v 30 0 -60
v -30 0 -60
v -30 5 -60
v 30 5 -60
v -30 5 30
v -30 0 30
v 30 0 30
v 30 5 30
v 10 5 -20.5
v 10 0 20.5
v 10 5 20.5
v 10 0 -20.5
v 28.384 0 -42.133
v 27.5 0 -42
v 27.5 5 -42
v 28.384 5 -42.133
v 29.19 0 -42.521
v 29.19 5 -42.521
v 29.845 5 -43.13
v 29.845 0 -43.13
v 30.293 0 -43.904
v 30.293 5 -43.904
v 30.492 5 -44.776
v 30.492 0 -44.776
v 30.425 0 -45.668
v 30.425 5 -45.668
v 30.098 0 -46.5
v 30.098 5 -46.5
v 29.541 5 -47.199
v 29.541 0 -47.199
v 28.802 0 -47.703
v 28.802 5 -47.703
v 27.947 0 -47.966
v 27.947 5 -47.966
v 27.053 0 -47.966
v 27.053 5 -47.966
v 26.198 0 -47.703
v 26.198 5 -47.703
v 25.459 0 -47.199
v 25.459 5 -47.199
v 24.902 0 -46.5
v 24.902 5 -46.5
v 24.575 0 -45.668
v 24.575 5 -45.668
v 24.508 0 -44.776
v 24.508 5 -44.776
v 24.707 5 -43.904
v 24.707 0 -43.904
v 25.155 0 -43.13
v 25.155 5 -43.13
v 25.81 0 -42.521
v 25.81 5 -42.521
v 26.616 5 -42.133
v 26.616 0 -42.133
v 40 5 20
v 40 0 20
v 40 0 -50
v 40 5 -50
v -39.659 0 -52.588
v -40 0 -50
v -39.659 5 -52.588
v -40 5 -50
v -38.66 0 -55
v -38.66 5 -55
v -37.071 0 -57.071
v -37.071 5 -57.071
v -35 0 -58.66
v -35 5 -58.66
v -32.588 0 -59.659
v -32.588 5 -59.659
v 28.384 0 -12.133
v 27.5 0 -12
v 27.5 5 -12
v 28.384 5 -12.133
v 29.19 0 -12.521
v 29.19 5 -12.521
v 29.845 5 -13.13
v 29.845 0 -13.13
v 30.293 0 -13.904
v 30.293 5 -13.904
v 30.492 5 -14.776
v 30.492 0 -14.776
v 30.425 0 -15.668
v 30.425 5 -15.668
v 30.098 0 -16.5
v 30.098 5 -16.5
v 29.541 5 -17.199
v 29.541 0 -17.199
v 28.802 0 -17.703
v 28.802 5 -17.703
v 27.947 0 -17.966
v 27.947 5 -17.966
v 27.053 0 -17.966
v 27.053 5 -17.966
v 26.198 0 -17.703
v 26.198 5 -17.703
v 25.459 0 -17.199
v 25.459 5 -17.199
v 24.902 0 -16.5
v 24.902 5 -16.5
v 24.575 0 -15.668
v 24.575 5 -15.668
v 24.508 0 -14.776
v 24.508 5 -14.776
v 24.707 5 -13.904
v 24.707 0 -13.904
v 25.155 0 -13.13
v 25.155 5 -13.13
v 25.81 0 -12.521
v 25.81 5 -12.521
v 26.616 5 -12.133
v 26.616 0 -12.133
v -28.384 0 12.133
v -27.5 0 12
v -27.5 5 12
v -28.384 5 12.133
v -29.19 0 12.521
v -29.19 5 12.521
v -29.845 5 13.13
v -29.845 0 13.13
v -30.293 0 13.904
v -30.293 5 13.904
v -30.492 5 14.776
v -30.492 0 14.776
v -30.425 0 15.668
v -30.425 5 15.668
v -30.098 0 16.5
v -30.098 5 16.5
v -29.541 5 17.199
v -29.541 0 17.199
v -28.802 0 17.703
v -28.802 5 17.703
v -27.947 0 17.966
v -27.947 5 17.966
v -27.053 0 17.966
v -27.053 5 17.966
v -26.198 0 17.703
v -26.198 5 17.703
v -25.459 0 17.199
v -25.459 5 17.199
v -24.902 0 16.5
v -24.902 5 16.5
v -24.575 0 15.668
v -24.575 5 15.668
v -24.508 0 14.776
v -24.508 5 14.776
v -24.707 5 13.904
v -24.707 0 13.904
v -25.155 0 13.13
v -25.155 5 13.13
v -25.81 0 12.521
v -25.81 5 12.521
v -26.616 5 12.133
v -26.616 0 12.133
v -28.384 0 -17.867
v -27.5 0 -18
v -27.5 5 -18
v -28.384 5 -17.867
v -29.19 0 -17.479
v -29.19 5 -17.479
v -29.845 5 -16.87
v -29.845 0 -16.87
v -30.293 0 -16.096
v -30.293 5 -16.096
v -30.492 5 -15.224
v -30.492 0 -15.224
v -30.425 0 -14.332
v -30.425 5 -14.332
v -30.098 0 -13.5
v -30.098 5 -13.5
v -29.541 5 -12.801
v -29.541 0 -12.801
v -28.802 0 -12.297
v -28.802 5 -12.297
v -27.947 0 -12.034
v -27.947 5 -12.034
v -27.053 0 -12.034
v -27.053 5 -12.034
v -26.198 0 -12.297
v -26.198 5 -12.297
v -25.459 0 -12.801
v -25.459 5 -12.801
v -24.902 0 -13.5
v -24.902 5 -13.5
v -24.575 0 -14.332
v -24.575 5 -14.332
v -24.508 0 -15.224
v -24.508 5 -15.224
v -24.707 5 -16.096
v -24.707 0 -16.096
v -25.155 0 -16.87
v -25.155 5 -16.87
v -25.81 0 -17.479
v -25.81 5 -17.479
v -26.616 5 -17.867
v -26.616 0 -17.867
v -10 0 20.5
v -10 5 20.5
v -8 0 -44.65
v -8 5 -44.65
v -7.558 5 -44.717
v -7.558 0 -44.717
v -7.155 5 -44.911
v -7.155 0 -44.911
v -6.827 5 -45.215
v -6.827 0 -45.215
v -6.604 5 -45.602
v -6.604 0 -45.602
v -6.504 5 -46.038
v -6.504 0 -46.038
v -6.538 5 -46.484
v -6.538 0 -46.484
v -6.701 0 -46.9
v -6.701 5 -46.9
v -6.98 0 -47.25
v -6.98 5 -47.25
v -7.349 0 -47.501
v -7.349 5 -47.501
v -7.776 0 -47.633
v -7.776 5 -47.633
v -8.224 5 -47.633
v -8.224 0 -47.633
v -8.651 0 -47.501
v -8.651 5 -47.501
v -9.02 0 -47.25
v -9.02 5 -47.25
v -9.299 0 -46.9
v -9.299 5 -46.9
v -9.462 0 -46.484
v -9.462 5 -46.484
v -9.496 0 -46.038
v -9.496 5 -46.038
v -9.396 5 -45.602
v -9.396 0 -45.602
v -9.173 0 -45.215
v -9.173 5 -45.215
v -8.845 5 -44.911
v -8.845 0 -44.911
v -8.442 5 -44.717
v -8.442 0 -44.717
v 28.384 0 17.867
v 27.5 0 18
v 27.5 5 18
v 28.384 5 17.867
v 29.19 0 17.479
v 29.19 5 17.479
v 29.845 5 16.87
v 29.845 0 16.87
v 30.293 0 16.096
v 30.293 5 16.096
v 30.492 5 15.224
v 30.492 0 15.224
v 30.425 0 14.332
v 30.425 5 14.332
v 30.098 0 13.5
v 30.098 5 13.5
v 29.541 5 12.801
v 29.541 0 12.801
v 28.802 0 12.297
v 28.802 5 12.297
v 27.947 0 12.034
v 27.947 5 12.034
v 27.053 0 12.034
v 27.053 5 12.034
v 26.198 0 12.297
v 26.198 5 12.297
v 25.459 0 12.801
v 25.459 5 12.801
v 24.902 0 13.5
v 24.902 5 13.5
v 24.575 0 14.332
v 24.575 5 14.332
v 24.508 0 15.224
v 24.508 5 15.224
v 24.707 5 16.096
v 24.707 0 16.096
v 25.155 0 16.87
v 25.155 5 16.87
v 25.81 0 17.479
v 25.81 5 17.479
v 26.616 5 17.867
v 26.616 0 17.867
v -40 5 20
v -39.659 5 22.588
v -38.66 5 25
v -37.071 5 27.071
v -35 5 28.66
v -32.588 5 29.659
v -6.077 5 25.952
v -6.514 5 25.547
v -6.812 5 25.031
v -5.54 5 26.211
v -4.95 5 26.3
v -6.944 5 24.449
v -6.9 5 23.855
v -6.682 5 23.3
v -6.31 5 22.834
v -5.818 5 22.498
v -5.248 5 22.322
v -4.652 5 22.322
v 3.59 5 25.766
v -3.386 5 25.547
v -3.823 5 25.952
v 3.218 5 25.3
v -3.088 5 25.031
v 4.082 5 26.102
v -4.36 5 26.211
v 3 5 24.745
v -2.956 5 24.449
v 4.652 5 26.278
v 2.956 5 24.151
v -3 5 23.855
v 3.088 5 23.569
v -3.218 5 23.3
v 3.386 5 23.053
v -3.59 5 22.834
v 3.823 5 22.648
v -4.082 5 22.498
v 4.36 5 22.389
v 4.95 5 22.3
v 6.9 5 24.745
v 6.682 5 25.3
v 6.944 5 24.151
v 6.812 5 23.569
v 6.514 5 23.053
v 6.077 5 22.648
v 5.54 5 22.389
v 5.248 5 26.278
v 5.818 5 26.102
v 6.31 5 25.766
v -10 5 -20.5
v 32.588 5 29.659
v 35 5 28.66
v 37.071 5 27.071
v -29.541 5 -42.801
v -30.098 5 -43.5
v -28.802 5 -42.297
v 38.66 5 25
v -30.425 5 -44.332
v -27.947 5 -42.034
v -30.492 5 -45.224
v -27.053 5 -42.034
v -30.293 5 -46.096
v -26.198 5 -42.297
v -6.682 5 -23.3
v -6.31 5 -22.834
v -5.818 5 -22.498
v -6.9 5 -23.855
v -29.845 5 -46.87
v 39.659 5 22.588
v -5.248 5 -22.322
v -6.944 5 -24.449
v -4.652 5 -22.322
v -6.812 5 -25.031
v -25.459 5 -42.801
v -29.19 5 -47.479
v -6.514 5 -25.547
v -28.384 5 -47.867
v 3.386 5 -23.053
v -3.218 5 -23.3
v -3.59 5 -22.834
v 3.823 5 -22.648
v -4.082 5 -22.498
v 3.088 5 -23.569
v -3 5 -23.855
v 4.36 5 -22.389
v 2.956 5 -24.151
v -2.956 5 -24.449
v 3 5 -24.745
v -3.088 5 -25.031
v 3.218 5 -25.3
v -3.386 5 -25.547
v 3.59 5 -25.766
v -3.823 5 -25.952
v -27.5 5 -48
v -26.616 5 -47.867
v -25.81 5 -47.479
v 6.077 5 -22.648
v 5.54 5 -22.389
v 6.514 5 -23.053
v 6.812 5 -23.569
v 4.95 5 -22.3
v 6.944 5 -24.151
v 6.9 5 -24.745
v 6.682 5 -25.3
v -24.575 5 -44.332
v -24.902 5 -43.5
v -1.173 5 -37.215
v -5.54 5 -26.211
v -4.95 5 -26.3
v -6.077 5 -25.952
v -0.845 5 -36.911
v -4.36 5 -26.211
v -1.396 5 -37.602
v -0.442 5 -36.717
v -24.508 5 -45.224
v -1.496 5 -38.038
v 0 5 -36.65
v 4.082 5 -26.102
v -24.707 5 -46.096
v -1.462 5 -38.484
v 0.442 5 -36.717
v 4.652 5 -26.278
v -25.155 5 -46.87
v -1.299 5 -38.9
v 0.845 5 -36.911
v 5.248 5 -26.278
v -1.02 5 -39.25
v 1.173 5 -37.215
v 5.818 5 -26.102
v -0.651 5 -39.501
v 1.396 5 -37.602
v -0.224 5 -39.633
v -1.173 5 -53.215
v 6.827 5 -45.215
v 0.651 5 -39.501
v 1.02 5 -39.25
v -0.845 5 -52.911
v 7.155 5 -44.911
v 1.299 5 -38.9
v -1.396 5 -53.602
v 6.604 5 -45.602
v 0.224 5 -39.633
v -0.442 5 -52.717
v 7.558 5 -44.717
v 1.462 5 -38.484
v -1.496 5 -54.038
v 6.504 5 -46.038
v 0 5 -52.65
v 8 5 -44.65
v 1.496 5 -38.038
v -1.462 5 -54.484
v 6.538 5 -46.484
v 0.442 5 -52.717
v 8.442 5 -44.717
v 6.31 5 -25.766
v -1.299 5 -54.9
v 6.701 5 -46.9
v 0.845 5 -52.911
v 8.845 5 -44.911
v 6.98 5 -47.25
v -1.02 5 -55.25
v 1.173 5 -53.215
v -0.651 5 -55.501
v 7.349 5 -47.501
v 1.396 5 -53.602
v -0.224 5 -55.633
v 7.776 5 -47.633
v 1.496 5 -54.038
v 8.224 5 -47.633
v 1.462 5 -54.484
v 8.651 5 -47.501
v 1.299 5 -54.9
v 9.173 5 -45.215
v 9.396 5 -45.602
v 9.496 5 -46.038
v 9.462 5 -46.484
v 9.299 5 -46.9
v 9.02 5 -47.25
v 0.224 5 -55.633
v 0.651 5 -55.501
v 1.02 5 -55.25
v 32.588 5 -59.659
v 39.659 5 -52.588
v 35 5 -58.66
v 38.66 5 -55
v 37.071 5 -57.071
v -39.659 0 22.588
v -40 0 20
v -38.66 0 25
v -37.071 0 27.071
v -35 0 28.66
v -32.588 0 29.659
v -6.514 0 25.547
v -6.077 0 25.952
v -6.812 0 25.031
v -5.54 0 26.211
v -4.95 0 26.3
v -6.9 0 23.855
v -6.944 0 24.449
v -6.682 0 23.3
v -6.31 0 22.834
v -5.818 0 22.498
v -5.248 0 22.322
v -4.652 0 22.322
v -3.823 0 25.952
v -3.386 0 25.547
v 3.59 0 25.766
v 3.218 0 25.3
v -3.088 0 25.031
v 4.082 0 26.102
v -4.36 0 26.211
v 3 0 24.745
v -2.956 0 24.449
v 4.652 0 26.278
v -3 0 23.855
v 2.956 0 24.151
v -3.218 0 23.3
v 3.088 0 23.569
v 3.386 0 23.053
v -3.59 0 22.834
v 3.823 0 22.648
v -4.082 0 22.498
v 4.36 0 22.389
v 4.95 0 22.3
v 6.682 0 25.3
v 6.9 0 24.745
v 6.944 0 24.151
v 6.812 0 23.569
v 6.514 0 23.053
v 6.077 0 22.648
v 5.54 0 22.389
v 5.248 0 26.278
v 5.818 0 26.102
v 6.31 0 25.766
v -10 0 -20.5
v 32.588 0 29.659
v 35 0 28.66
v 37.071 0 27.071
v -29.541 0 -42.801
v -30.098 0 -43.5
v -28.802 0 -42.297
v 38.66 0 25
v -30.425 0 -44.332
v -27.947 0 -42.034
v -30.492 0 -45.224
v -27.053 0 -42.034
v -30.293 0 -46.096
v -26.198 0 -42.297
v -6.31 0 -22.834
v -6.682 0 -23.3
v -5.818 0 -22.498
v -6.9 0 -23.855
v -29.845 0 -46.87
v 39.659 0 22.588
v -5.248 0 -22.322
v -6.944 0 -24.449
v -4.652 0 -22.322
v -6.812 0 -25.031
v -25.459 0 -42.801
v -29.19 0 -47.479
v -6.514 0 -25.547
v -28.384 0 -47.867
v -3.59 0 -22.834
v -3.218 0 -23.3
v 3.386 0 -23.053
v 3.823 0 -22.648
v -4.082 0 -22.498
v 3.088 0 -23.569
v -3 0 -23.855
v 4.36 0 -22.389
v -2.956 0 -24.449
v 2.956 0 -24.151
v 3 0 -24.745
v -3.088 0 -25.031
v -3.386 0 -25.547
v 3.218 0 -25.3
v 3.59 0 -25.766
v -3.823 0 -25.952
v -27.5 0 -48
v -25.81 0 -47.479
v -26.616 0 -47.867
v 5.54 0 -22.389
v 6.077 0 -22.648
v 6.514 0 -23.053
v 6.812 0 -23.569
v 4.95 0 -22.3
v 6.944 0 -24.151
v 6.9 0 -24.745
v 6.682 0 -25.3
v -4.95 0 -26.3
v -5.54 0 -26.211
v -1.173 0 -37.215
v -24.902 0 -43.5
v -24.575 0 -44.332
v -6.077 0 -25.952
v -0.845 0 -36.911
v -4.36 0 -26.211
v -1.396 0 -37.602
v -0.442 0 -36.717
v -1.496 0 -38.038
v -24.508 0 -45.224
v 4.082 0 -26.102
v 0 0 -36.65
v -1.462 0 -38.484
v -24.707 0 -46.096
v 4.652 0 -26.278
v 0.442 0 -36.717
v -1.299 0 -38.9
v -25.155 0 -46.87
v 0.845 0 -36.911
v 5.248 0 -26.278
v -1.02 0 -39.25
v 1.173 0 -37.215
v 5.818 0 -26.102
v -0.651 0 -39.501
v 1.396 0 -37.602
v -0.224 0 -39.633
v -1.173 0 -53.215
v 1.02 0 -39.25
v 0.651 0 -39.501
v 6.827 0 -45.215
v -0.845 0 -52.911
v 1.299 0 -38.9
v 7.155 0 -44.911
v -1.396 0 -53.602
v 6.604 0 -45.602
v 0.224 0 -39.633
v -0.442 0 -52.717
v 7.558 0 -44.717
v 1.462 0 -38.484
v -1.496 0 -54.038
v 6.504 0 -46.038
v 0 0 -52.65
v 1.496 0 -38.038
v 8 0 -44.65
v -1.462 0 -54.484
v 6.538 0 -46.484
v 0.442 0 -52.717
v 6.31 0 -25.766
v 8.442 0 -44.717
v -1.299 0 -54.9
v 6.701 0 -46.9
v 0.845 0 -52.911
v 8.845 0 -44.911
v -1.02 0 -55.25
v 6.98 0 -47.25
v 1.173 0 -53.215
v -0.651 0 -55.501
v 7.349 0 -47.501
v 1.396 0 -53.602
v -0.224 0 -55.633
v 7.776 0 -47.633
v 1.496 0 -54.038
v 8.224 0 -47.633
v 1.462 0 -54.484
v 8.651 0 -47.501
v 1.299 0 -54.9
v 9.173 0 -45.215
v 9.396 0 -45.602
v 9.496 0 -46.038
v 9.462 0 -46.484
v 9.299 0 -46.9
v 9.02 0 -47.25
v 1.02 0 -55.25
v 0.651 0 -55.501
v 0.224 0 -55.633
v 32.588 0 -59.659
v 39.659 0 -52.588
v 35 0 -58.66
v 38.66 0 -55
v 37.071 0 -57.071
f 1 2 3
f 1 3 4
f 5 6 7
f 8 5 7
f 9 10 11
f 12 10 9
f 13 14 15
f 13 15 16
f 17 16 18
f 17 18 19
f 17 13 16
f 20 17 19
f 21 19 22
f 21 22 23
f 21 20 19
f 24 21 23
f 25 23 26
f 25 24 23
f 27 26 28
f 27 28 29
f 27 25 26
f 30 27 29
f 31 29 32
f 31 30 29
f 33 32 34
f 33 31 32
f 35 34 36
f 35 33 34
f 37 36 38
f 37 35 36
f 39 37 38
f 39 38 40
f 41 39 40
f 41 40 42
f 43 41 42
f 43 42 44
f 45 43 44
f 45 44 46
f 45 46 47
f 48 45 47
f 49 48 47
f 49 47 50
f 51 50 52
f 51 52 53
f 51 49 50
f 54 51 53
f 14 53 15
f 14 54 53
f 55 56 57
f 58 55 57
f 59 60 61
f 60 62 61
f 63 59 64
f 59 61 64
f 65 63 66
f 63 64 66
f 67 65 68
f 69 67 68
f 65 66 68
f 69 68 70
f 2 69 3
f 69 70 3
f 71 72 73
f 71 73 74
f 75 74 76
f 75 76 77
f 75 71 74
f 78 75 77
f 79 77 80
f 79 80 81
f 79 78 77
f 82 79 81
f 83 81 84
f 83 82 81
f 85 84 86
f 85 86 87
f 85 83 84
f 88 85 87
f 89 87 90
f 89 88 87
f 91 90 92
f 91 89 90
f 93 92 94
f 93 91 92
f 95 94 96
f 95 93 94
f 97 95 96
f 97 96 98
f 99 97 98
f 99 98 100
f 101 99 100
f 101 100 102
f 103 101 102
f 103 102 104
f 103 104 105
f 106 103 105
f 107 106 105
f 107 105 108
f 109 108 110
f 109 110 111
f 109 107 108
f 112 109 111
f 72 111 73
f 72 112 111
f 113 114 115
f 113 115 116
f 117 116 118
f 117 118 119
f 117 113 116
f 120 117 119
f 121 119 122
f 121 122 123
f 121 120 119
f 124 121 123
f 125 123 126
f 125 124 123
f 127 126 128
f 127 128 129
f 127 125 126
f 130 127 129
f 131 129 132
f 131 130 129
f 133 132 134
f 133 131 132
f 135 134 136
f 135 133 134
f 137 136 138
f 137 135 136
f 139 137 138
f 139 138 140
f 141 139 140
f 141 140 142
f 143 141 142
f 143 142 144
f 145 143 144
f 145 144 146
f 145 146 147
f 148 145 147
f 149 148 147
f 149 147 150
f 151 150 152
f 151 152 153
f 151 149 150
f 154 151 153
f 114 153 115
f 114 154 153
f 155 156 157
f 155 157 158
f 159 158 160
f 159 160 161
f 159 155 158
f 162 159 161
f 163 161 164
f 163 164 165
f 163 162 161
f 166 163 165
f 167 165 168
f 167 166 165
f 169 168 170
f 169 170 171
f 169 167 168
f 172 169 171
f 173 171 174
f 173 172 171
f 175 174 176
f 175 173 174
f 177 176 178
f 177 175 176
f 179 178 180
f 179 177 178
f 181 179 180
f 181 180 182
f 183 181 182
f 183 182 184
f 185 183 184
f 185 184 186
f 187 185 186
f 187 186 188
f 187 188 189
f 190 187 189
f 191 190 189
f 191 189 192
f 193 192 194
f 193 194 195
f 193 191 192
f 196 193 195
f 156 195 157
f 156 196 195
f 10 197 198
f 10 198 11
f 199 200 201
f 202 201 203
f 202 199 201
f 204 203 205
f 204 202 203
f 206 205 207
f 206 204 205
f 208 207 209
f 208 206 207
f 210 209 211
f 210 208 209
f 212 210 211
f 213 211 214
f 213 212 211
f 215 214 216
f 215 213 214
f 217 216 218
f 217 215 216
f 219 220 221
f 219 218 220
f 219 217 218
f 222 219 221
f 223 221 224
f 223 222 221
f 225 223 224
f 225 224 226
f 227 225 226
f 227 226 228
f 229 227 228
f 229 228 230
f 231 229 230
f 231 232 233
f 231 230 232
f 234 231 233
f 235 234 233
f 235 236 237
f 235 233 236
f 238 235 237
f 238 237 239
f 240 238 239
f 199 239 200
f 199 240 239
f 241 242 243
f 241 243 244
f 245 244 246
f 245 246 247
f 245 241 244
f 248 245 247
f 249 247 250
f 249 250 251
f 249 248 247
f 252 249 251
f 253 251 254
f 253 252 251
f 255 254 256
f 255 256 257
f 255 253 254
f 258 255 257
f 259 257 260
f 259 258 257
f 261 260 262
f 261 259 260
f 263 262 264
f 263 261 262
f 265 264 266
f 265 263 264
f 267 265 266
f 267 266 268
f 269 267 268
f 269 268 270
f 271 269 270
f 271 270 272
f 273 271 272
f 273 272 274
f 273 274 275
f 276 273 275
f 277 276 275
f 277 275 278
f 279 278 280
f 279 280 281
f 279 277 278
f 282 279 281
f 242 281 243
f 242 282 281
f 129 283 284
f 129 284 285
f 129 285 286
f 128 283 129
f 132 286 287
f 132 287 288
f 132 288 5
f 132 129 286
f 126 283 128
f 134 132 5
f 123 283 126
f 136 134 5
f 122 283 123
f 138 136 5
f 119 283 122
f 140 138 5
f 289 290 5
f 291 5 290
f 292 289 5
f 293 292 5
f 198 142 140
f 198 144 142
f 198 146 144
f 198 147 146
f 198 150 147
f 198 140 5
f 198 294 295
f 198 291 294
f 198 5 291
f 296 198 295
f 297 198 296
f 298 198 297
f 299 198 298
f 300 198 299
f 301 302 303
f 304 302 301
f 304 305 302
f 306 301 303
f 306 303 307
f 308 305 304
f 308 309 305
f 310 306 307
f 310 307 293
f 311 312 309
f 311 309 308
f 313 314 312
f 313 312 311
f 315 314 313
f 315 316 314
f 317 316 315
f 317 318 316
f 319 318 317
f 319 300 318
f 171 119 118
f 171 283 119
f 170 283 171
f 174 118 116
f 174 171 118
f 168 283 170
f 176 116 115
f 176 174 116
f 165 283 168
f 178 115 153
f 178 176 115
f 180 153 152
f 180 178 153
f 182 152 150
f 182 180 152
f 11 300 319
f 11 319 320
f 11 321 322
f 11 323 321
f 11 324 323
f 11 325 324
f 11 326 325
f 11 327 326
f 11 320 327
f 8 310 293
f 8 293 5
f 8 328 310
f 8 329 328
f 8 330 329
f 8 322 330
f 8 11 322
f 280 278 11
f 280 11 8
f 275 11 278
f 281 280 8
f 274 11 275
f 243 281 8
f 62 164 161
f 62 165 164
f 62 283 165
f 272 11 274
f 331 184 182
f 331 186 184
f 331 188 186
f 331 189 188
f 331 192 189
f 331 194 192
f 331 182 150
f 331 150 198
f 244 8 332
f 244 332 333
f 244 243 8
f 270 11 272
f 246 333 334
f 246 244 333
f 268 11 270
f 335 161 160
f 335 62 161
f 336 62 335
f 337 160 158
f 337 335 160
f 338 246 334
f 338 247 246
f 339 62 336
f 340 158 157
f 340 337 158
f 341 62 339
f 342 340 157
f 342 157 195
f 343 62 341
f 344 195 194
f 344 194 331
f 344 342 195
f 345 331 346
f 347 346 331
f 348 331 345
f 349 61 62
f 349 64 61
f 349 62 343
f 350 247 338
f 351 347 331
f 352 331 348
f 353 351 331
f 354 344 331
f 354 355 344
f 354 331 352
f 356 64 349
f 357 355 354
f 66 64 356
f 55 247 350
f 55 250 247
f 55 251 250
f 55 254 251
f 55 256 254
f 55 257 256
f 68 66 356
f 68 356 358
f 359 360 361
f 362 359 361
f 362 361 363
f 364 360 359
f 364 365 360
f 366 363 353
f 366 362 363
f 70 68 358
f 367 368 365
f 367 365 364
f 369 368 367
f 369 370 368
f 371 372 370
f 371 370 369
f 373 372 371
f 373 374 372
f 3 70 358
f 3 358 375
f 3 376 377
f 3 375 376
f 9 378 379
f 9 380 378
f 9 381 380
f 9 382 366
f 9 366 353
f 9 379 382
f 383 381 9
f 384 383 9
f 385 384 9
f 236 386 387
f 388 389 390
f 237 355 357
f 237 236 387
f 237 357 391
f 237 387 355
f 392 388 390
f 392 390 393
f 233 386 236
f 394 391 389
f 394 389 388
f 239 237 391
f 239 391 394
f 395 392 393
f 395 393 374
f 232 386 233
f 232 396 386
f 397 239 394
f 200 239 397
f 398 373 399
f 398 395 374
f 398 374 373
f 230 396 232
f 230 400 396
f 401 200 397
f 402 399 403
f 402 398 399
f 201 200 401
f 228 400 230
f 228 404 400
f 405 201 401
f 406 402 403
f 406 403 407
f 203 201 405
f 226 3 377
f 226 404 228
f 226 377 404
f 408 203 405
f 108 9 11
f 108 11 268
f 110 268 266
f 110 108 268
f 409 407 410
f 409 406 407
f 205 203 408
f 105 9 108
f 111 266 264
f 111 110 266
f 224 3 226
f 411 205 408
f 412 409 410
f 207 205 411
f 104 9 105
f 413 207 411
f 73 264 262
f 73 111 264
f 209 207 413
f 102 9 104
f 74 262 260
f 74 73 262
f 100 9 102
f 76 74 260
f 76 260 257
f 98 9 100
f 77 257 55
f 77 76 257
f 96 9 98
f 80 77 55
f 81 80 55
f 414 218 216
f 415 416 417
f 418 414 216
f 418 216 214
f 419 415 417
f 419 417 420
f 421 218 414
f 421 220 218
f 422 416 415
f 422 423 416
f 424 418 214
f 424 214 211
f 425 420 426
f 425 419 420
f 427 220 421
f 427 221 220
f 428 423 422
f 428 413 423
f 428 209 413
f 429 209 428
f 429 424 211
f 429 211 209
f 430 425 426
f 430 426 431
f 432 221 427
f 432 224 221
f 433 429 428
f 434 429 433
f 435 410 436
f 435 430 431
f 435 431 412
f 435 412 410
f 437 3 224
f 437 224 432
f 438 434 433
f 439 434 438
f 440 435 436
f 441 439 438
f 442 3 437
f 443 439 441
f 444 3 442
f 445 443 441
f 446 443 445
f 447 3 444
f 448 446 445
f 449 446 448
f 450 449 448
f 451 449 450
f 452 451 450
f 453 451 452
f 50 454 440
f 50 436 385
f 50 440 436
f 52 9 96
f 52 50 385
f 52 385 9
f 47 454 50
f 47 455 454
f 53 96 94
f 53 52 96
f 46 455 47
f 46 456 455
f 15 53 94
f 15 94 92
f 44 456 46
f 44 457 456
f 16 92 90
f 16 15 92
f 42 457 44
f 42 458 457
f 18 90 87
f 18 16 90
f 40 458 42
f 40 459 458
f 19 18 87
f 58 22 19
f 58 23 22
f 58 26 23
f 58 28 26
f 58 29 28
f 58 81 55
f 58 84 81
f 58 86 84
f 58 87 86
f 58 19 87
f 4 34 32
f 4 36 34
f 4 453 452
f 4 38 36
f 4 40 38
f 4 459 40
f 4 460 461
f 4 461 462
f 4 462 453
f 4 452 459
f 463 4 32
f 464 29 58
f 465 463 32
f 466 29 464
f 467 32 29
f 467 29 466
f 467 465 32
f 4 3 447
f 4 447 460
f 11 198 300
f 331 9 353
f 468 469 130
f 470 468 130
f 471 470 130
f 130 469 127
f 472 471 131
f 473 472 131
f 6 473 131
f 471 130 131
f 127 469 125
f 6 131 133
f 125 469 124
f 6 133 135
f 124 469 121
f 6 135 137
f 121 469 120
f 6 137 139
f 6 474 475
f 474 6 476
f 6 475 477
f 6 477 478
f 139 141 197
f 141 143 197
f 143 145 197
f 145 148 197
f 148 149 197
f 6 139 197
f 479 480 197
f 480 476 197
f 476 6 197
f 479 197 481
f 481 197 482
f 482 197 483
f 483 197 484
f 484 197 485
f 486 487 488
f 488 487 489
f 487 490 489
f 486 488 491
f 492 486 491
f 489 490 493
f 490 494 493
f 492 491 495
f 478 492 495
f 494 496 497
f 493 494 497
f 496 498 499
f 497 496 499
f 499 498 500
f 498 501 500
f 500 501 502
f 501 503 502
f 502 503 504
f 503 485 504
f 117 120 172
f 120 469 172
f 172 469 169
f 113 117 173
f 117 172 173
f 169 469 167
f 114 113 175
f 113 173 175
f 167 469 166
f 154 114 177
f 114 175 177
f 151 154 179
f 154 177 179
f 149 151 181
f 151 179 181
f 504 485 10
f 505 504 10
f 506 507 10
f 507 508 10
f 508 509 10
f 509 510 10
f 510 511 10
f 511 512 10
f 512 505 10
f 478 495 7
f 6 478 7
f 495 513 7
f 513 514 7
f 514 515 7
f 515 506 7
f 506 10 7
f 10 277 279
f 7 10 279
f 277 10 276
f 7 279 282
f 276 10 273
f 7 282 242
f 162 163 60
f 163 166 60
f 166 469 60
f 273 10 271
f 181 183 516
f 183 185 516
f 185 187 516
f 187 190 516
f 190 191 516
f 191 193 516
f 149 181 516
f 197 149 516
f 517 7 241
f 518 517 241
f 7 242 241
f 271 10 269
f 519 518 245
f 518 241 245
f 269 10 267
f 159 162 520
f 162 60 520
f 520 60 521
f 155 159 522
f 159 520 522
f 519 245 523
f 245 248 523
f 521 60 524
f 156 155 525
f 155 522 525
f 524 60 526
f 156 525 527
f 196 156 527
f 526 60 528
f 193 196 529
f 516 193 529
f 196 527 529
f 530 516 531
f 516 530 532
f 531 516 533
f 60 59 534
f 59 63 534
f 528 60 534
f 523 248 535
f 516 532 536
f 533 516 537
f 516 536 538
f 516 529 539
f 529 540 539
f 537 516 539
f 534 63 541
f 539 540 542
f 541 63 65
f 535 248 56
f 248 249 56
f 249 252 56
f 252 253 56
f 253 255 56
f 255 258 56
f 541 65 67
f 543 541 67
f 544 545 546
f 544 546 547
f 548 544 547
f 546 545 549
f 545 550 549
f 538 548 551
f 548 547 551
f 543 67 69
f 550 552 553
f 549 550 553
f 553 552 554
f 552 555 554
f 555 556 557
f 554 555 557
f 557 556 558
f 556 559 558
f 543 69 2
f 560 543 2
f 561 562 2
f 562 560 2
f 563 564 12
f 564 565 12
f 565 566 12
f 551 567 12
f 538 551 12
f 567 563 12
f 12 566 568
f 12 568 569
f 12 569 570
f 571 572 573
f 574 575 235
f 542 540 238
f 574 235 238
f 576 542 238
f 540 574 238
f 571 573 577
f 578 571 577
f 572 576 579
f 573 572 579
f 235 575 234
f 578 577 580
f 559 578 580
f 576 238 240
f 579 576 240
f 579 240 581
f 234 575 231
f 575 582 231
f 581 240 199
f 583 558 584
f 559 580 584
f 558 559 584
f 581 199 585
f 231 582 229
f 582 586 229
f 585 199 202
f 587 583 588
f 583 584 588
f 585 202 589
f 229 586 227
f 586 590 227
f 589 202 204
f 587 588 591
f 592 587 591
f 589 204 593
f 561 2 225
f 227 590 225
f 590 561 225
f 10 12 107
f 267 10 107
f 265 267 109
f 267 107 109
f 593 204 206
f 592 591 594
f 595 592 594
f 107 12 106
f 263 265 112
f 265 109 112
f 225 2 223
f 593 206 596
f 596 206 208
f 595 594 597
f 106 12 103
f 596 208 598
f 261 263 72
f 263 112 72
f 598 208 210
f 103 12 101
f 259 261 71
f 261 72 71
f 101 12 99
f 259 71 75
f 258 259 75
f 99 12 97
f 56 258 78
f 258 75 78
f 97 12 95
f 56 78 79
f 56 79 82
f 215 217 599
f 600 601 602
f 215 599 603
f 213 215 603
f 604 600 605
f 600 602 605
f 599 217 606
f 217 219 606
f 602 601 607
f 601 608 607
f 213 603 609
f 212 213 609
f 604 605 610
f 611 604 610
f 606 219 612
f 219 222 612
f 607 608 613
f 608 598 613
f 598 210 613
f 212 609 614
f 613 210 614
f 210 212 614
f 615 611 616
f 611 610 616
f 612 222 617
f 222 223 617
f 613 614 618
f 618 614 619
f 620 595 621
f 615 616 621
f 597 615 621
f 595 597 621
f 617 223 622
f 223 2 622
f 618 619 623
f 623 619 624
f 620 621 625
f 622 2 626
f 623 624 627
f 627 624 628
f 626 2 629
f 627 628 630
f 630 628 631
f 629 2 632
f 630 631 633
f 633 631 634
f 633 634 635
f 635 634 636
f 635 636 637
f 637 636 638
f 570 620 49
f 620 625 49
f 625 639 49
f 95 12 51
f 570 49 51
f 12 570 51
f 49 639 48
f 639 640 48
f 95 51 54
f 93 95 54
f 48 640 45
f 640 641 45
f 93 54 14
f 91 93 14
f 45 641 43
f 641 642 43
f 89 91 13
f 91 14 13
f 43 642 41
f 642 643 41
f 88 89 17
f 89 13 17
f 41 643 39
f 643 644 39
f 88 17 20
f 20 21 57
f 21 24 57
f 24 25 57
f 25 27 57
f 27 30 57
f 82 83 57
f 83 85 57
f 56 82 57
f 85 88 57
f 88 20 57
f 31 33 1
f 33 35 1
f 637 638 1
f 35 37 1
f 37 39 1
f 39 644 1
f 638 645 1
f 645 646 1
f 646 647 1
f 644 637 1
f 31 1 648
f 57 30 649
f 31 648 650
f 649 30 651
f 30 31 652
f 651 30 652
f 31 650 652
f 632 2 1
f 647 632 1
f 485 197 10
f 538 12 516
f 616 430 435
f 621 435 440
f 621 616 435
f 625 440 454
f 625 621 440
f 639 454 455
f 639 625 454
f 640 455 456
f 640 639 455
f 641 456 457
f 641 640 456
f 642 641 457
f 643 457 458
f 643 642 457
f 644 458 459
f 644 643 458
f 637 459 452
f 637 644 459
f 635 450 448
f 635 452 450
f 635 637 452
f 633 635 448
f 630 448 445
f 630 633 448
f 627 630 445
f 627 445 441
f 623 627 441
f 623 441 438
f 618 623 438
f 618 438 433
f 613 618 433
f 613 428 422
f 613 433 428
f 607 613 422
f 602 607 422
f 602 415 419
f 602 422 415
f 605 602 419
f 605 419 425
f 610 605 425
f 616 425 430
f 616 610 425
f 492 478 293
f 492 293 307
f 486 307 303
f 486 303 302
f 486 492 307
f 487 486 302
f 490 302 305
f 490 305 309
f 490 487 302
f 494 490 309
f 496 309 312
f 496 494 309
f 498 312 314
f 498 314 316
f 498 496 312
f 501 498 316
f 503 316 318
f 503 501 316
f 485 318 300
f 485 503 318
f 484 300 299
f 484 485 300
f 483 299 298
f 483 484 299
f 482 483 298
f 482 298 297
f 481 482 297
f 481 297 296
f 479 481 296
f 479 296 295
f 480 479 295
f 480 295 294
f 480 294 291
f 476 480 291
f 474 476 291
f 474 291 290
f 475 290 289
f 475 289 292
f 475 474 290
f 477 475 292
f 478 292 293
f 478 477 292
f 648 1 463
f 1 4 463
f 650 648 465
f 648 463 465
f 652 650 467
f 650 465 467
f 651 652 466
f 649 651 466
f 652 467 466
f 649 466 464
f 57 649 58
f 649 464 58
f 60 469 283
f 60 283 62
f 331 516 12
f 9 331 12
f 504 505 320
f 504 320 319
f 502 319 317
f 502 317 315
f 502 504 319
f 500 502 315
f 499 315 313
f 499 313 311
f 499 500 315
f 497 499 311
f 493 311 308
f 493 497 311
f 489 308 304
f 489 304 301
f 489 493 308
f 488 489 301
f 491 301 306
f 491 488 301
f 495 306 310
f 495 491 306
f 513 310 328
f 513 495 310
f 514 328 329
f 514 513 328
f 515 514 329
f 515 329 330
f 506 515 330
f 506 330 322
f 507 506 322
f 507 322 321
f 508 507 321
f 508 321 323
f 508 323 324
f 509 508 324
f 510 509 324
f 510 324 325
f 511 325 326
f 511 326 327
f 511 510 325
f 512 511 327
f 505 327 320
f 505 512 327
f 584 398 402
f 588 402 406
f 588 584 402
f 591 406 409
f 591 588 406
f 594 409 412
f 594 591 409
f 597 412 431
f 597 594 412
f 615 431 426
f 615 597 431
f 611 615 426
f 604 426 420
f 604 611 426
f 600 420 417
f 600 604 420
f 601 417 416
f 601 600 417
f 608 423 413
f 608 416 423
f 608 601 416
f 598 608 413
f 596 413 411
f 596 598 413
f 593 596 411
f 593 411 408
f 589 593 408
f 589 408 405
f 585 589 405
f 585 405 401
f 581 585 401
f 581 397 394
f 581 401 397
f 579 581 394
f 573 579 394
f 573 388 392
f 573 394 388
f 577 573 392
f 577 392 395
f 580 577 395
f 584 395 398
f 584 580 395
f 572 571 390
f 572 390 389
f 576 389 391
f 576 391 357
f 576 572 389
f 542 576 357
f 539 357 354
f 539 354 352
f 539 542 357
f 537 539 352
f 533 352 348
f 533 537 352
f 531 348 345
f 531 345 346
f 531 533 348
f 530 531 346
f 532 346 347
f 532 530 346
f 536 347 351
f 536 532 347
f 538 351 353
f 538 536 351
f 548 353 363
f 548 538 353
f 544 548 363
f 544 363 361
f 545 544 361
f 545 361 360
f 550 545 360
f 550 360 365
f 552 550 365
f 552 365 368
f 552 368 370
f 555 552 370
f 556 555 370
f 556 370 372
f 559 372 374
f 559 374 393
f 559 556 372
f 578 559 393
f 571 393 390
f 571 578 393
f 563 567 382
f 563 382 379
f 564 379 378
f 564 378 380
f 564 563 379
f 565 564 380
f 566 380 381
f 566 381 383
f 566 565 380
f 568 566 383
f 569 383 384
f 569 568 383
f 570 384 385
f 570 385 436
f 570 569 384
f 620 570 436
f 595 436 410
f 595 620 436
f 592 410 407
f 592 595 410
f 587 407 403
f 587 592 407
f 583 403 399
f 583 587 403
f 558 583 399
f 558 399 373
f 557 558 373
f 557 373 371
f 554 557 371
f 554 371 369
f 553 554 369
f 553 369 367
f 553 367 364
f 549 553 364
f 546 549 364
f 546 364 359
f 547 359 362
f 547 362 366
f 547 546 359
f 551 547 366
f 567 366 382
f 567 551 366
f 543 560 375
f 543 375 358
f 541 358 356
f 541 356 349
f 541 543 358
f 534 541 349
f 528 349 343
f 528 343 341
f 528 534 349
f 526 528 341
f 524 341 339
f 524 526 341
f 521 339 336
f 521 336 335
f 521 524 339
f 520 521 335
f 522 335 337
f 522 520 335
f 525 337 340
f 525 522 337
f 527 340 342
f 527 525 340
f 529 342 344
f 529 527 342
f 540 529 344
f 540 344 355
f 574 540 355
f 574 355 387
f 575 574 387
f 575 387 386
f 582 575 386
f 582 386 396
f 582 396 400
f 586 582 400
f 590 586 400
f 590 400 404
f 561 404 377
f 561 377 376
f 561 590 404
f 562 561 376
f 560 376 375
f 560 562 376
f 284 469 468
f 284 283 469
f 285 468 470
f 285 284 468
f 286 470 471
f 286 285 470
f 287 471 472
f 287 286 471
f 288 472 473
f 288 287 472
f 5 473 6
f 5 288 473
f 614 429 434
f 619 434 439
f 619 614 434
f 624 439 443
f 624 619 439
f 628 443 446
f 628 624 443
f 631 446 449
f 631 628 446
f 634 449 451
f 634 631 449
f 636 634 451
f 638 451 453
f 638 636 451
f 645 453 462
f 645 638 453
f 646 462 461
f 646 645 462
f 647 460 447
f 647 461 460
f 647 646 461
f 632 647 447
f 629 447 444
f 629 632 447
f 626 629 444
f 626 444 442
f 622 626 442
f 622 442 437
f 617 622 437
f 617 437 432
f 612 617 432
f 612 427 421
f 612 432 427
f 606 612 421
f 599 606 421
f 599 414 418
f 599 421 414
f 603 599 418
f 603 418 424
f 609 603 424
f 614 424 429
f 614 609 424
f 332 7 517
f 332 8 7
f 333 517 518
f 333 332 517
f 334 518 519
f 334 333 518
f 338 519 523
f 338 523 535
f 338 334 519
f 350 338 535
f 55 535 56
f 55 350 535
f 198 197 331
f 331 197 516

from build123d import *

# Parameters (mm, degrees)
SKETCH_1_W          = 80
SKETCH_1_H          = 90
SKETCH_1_R          = 3
SKETCH_1_R_2        = 2
SKETCH_1_W_2        = 20
SKETCH_1_H_2        = 41
EXTRUDE_1_DEPTH     = 5
FILLET_1_R          = 10
SKETCH_2_R          = 1.5
CUT_EXTRUDE_1_DEPTH = 73.284161474


with BuildPart() as part:
    # 草图1 → 凸台-拉伸1 (new body)
    with BuildSketch(Plane(origin=(0, 0, 0), x_dir=(1, 0, 0), z_dir=(0, 1, 0))):
        with Locations((0, 15)):
            Rectangle(SKETCH_1_W, SKETCH_1_H)
        with Locations(Location((27.5, 15, 0), (0, 0, 270))):
            Circle(SKETCH_1_R, mode=Mode.SUBTRACT)
        with Locations(Location((27.5, -15, 0), (0, 0, 270))):
            Circle(SKETCH_1_R, mode=Mode.SUBTRACT)
        with Locations(Location((-27.5, -15, 0), (0, 0, 90))):
            Circle(SKETCH_1_R, mode=Mode.SUBTRACT)
        with Locations(Location((-27.5, 15, 0), (0, 0, 90))):
            Circle(SKETCH_1_R, mode=Mode.SUBTRACT)
        with Locations(Location((4.95, 24.3, 0), (0, 0, 270))):
            Circle(SKETCH_1_R_2, mode=Mode.SUBTRACT)
        with Locations(Location((-4.95, 24.3, 0), (0, 0, 90))):
            Circle(SKETCH_1_R_2, mode=Mode.SUBTRACT)
        with Locations(Location((4.95, -24.3, 0), (0, 0, 90))):
            Circle(SKETCH_1_R_2, mode=Mode.SUBTRACT)
        with Locations(Location((-4.95, -24.3, 0), (0, 0, 270))):
            Circle(SKETCH_1_R_2, mode=Mode.SUBTRACT)
        with Locations(Location((-27.5, 45, 0), (0, 0, 90))):
            Circle(SKETCH_1_R, mode=Mode.SUBTRACT)
        with Locations(Location((27.5, 45, 0), (0, 0, 270))):
            Circle(SKETCH_1_R, mode=Mode.SUBTRACT)
        Rectangle(SKETCH_1_W_2, SKETCH_1_H_2, mode=Mode.SUBTRACT)
    extrude(amount=EXTRUDE_1_DEPTH)

    # 圆角1
    fillet_1_edges = [part.edges().sort_by_distance(p)[0] for p in [
        (40, 2.5, -60),
        (40, 2.5, 30),
        (-40, 2.5, 30),
        (-40, 2.5, -60),
    ]]
    fillet(fillet_1_edges, radius=FILLET_1_R)

    # 草图2 → 切除-拉伸1 (cut, through all)
    with BuildSketch(Plane(origin=(0, 0, 0), x_dir=(1, 0, 0), z_dir=(0, 1, 0))):
        with Locations(Location((0, 54.15, 0), (0, 0, 270))):
            Circle(SKETCH_2_R)
        with Locations(Location((8, 46.15, 0), (0, 0, 270))):
            Circle(SKETCH_2_R)
        with Locations(Location((0, 38.15, 0), (0, 0, 270))):
            Circle(SKETCH_2_R)
        with Locations(Location((-8, 46.15, 0), (0, 0, 270))):
            Circle(SKETCH_2_R)
    extrude(amount=CUT_EXTRUDE_1_DEPTH, mode=Mode.SUBTRACT)


solid = part.part
